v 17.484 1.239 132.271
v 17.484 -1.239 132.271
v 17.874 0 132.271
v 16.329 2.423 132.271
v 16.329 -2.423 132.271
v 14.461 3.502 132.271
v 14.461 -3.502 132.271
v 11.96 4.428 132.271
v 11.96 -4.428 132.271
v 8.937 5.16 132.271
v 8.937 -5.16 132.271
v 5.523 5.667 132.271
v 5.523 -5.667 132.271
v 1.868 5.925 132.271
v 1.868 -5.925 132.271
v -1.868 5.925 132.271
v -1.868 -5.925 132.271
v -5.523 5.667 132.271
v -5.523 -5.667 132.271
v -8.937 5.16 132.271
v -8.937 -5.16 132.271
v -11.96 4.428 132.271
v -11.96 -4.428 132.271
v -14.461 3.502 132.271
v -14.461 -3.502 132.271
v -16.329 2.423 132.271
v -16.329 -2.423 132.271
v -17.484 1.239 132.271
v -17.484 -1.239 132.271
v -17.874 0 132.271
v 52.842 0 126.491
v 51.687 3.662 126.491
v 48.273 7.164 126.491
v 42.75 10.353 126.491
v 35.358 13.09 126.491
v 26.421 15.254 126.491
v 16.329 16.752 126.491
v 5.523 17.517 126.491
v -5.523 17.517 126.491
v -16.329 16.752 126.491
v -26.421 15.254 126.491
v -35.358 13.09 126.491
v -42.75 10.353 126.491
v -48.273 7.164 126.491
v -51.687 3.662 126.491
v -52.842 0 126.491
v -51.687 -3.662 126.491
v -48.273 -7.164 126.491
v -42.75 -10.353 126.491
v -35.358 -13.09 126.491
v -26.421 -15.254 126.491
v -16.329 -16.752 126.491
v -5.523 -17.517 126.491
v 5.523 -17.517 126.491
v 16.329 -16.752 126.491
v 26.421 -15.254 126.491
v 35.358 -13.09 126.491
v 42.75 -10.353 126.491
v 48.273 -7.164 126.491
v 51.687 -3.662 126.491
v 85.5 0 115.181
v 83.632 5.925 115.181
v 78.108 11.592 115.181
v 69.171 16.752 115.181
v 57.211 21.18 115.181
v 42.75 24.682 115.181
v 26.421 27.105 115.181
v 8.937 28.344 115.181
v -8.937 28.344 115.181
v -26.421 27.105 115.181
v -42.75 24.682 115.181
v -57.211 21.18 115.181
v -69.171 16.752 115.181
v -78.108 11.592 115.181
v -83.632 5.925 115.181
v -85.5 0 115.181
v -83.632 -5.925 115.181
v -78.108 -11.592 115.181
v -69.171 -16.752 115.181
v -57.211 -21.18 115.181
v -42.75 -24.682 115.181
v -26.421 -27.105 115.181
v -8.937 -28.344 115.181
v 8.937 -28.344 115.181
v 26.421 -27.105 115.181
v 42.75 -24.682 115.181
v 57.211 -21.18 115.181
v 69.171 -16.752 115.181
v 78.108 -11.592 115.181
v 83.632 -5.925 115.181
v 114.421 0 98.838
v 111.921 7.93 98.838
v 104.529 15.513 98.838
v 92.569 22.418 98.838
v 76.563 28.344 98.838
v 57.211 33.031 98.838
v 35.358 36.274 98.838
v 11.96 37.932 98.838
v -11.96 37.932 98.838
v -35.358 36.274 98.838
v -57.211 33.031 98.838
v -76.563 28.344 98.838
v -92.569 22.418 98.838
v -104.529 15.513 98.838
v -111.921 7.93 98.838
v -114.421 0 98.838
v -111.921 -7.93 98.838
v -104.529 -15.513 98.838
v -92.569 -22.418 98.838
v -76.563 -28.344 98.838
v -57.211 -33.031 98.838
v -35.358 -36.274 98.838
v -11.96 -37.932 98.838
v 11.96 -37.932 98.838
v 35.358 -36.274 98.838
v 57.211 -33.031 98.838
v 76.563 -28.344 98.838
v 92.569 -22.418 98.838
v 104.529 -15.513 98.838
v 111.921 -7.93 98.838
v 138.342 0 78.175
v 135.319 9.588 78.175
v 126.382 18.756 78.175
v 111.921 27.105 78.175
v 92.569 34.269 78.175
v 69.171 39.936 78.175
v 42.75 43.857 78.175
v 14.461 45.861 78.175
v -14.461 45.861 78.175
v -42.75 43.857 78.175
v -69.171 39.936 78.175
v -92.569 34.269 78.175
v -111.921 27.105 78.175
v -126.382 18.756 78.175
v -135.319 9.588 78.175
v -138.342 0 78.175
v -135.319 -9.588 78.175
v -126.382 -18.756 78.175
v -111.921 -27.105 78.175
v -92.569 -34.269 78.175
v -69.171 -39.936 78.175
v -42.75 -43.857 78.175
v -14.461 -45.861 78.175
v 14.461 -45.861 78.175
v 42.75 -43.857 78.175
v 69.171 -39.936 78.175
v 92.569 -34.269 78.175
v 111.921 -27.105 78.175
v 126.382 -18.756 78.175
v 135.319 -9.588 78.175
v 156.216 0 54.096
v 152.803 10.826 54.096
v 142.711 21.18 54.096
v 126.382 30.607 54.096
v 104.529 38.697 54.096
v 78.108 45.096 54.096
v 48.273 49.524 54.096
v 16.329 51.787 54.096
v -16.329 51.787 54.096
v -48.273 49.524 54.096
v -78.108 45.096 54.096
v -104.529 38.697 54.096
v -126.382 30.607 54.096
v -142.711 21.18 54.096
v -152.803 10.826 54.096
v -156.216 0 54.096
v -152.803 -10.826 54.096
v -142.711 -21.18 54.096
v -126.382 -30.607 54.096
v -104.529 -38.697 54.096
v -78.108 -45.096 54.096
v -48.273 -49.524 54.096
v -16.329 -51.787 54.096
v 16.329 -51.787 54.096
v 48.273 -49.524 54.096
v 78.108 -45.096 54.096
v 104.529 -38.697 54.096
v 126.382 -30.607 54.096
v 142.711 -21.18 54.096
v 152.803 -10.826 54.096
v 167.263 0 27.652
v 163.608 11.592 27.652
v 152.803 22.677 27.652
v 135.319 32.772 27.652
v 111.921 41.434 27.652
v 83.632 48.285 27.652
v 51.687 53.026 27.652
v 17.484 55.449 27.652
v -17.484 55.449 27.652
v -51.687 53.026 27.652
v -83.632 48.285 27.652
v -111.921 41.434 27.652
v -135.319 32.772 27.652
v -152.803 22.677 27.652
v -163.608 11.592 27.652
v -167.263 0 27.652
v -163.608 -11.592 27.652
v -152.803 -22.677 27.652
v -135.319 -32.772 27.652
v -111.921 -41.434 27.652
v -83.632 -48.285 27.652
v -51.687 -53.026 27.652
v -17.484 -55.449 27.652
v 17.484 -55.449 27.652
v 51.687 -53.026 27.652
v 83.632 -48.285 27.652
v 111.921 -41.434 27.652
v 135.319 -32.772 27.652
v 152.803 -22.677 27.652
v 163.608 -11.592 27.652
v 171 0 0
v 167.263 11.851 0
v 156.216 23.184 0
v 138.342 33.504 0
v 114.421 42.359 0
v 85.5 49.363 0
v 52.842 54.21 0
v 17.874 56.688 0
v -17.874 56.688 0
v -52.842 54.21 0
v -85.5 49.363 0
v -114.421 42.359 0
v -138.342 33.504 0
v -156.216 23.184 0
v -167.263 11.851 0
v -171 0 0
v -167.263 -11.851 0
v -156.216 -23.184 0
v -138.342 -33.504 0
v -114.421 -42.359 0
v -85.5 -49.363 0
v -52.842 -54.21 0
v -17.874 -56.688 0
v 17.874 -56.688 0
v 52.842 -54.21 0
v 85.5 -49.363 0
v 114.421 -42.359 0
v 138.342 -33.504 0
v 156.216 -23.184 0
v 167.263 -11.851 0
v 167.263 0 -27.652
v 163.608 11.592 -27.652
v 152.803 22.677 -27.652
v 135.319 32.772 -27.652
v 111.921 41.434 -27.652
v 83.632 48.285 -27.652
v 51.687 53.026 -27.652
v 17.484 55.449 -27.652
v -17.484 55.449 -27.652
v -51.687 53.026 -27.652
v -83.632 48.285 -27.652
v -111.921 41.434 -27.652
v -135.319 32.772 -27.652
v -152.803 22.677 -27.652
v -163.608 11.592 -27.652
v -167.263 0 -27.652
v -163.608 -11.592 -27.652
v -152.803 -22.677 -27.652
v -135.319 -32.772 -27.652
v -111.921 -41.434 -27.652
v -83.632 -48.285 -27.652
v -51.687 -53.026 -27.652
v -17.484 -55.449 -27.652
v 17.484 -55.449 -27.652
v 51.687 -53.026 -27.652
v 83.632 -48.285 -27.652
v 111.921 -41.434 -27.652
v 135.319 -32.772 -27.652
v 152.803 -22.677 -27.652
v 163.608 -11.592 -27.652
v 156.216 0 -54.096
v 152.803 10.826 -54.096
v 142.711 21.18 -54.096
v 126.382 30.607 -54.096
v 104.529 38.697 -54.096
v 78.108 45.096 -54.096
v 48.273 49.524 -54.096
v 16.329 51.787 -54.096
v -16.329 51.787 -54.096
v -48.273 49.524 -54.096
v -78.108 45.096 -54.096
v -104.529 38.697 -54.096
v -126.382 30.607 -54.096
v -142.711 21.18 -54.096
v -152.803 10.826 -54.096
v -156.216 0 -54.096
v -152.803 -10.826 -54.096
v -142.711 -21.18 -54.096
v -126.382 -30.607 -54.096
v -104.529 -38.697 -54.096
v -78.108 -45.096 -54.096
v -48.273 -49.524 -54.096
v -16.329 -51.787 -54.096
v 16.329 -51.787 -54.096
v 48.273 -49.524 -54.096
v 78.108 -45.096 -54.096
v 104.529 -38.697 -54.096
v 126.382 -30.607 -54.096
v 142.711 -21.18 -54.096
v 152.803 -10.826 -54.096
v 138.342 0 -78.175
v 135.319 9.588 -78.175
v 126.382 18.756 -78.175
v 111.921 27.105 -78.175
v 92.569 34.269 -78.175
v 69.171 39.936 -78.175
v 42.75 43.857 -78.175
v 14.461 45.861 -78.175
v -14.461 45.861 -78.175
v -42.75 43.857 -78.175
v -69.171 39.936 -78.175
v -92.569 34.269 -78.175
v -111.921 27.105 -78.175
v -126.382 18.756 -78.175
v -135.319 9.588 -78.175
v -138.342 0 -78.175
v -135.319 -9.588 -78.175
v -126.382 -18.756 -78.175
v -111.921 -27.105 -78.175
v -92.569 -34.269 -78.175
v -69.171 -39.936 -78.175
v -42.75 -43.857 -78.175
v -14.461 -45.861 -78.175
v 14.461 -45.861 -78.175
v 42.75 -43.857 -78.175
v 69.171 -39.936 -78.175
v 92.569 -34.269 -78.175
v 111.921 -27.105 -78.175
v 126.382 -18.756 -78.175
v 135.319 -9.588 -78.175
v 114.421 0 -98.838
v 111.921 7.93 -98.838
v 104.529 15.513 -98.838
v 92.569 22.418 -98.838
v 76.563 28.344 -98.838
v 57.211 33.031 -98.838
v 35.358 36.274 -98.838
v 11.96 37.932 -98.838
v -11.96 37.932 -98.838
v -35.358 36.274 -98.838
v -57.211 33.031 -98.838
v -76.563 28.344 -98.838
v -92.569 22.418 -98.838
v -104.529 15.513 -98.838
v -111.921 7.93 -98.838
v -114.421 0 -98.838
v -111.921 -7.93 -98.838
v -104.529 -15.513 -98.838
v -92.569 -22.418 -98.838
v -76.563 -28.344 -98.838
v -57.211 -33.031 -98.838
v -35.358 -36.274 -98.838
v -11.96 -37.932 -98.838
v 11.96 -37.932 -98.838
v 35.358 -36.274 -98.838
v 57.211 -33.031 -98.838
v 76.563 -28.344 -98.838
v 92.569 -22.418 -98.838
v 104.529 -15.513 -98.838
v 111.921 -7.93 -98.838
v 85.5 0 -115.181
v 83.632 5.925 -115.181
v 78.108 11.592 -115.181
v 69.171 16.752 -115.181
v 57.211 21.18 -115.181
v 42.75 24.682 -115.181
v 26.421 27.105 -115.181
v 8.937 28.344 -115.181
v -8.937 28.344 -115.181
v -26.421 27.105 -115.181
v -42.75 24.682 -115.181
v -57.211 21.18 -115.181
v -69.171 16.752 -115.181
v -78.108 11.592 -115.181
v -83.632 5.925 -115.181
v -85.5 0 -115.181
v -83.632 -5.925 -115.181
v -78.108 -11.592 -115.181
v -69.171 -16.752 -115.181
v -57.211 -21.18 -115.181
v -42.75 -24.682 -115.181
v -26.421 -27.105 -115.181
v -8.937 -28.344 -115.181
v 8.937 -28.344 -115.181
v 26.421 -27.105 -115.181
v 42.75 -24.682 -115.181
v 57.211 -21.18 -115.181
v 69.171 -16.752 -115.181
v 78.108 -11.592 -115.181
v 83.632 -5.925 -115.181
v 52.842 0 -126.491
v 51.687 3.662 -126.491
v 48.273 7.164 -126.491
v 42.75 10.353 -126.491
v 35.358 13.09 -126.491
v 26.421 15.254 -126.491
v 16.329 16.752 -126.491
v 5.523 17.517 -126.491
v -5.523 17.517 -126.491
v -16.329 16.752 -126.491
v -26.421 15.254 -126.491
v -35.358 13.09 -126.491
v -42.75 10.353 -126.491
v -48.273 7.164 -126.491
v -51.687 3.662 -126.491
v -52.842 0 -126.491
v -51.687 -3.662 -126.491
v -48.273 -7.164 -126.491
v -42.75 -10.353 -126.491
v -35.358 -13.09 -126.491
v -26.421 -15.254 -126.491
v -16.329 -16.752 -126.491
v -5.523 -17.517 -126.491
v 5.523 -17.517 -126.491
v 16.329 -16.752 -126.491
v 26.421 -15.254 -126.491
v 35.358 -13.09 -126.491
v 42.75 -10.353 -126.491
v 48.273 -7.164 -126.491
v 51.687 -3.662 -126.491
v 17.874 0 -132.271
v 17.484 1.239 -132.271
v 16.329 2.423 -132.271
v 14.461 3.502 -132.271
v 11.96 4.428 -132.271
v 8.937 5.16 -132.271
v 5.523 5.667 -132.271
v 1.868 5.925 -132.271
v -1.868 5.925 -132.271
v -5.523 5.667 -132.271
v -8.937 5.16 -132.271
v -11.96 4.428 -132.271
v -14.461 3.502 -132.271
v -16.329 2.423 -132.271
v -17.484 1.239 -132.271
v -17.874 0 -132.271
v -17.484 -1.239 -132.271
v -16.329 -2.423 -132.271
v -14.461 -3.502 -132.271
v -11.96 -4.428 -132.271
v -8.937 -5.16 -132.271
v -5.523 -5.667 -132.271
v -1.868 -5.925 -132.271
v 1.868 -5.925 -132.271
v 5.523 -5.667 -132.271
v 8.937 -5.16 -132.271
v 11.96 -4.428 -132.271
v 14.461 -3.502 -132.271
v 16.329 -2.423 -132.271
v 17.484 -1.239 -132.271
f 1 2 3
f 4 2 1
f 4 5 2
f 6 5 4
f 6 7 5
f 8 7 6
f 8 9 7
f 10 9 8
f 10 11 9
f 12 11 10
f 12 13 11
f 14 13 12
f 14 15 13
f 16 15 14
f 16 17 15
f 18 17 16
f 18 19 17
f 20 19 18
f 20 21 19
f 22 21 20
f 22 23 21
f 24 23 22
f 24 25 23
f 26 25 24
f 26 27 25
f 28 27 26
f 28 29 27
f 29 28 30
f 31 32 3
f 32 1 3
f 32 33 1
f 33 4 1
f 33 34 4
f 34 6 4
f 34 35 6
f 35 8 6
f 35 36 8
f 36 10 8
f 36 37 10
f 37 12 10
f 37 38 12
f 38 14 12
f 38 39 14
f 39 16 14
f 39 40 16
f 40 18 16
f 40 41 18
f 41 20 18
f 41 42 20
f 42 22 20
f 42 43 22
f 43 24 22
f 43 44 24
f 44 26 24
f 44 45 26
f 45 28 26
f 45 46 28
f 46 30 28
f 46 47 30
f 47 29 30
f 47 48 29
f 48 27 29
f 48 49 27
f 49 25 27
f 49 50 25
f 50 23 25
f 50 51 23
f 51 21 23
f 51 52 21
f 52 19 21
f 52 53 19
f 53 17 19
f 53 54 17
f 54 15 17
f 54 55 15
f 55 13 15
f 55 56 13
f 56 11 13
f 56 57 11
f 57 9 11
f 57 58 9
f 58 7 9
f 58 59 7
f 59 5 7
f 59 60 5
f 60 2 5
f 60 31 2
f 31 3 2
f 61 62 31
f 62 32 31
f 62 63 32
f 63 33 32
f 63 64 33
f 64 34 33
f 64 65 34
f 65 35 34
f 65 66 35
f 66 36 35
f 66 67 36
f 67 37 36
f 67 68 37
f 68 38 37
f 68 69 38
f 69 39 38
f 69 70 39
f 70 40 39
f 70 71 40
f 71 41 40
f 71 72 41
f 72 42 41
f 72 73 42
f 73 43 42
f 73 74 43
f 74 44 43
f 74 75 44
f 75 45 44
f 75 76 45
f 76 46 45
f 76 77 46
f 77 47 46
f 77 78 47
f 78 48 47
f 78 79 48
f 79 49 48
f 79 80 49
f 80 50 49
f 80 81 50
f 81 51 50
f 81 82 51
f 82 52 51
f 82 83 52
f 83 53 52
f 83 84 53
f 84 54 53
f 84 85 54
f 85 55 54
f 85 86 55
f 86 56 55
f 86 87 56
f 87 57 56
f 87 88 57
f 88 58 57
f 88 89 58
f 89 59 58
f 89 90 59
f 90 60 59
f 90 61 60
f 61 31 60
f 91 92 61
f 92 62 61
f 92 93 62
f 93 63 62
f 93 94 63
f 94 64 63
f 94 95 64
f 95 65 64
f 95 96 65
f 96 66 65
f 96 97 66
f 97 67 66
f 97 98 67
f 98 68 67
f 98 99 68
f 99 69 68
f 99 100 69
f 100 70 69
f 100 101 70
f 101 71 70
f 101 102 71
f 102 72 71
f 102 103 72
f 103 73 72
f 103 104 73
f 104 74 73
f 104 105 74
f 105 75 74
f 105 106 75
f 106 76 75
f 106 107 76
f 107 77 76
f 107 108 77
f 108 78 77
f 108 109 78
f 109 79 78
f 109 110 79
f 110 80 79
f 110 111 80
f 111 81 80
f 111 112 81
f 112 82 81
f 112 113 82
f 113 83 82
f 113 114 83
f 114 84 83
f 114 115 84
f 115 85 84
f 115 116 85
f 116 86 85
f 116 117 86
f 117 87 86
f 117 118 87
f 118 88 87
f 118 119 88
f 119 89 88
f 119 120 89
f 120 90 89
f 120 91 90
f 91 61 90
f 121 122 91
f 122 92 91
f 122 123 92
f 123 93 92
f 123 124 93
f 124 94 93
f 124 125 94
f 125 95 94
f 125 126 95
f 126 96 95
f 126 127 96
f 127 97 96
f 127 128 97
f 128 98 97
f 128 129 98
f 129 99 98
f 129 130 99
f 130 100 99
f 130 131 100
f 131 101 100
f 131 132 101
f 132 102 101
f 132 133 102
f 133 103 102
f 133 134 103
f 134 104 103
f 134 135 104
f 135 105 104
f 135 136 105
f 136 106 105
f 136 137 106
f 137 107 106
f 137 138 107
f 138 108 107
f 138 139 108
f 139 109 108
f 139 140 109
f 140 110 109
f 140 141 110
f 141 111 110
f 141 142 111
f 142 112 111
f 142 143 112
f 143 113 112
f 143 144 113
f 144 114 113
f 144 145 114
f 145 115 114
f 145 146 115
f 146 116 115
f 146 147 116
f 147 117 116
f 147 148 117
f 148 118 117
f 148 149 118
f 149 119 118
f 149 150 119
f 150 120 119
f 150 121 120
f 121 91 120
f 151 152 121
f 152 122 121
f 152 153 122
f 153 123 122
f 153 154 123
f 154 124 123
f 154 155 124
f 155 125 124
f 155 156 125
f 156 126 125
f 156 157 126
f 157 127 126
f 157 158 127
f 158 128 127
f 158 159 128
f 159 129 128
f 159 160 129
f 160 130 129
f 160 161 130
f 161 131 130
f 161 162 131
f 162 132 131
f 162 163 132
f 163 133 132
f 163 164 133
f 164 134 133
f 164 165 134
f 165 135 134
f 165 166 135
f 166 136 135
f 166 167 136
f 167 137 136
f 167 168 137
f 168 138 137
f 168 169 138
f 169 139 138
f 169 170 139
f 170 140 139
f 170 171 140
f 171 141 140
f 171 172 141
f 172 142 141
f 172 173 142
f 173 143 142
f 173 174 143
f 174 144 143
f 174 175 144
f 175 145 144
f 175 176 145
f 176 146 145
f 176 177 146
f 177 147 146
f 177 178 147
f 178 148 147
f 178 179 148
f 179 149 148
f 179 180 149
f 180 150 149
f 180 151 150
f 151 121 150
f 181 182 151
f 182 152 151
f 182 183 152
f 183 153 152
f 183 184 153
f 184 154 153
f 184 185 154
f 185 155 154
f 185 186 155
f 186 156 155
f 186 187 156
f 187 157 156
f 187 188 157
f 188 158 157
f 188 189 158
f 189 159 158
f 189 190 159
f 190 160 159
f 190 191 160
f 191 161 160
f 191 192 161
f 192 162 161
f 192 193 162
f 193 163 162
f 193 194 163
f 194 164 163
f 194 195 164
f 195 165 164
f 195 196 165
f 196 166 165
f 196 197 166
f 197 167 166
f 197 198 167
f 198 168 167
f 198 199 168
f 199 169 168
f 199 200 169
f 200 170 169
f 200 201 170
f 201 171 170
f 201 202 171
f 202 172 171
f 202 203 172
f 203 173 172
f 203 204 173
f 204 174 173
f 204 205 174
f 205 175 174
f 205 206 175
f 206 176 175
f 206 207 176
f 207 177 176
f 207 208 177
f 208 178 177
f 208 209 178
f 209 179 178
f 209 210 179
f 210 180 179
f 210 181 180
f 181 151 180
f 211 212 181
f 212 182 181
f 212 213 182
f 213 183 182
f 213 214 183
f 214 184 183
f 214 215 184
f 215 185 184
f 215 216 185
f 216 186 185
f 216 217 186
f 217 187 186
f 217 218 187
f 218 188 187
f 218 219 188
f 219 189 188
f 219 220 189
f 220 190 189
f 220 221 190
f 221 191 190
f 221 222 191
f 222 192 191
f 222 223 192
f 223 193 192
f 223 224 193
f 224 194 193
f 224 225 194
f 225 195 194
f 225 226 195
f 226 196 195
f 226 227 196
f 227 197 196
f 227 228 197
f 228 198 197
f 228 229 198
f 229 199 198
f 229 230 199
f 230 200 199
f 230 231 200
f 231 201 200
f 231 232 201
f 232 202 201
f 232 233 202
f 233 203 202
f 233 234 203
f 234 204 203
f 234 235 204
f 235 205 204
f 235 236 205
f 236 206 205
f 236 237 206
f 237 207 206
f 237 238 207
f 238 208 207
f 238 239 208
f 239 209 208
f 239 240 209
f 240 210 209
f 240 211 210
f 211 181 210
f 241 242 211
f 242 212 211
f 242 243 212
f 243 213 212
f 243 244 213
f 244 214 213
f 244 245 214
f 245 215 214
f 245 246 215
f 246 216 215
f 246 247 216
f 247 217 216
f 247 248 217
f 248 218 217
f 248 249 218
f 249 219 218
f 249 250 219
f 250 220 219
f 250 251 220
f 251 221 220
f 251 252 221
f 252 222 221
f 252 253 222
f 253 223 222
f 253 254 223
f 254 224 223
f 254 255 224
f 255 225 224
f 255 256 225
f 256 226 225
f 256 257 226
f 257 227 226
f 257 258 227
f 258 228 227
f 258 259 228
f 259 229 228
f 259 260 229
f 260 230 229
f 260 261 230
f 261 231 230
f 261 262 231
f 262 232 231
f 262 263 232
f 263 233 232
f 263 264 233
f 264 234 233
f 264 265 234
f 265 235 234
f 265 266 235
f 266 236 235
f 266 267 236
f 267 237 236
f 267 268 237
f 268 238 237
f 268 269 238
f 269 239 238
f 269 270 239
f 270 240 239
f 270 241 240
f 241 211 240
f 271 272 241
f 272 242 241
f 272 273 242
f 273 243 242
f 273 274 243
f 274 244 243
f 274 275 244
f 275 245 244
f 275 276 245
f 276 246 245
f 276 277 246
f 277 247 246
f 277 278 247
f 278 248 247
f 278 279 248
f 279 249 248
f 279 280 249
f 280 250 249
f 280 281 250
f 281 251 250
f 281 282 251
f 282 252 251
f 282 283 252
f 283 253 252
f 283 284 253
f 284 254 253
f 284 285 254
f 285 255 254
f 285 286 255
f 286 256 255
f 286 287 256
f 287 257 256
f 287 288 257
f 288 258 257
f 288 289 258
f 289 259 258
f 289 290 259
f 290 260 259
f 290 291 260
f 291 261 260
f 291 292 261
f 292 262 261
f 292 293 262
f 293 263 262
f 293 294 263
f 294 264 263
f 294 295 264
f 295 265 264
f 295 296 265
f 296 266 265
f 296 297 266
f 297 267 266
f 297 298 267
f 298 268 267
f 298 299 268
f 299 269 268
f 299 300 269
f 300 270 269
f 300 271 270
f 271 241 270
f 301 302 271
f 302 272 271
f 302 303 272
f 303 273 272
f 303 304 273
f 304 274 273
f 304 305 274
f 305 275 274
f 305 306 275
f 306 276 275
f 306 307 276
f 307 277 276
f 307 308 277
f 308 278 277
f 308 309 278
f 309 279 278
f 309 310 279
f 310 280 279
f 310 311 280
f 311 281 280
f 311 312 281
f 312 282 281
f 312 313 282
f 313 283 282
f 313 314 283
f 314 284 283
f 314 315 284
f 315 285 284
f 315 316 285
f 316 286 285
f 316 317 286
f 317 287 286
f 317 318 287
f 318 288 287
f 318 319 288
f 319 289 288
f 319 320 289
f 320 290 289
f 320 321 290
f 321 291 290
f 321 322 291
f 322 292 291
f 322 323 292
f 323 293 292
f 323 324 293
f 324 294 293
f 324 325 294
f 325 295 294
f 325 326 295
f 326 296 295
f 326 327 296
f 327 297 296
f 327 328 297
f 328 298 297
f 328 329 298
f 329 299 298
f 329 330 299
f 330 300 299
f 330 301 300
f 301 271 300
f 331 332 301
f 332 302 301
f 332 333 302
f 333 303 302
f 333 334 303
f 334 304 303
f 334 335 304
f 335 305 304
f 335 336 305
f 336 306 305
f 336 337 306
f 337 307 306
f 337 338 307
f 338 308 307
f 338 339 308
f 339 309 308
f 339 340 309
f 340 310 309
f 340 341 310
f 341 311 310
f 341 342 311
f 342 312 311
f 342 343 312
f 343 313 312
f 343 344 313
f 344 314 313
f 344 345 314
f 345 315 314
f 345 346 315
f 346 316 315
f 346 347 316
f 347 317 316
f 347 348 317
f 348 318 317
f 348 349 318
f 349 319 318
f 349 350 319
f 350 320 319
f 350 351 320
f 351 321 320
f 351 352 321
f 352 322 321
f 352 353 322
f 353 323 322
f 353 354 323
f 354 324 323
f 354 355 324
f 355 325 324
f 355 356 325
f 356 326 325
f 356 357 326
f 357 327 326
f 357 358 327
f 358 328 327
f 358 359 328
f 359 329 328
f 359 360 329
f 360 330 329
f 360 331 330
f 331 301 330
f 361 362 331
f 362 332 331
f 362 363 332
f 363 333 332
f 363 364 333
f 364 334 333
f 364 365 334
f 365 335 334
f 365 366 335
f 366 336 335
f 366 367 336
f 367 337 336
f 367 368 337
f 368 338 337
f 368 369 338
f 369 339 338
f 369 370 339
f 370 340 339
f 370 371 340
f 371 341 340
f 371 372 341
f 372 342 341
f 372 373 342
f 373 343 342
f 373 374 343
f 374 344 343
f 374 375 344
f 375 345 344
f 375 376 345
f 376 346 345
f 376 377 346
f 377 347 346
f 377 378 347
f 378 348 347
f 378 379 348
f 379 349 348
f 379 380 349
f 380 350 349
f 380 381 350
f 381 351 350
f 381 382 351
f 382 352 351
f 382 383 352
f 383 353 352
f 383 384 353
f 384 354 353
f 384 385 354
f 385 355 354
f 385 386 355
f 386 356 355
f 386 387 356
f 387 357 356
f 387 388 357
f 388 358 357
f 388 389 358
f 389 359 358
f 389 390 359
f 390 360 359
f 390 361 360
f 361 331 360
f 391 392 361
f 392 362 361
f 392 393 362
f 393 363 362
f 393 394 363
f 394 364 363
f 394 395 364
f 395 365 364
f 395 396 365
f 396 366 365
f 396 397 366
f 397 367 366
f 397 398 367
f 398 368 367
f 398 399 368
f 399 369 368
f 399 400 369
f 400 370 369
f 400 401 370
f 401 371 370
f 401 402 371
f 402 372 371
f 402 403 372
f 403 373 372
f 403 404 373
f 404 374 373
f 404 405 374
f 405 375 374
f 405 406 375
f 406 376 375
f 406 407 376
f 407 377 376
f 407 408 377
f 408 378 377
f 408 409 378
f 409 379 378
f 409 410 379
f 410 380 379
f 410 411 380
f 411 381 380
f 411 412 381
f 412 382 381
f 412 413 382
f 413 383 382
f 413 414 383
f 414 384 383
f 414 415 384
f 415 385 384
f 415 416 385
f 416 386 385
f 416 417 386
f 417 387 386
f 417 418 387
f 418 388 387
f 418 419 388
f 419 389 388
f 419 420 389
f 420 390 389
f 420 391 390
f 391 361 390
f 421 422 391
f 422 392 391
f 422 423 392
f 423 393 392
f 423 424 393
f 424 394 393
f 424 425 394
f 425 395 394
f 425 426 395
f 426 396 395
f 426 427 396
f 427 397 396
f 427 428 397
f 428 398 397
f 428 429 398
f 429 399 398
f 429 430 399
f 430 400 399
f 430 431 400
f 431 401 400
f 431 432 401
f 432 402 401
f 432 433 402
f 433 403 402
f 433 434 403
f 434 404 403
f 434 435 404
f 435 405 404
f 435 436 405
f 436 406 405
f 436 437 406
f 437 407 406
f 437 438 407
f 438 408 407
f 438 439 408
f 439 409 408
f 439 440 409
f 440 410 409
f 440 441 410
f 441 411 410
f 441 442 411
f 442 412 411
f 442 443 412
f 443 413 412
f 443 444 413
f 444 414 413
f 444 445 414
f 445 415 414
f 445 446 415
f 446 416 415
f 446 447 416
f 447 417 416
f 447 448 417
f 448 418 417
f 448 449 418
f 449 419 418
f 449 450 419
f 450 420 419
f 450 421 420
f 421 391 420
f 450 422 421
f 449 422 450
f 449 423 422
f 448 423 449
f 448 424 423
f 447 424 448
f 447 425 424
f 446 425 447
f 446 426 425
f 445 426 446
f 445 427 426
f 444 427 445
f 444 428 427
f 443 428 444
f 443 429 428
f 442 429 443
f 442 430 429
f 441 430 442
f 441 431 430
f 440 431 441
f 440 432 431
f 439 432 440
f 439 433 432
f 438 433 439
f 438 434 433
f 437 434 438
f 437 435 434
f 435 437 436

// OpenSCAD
// Generated by SolidPython 1.0.1 on 2020-07-29 00:46:48


scale(v = [9, 3, 7]) {
	sphere(r = 19);
}
/***********************************************
*********      SolidPython code:      **********
************************************************
 
# import packages: SolidPython
from solid import *
from solid.utils import *
from itertools import chain, combinations, permutations


class Resize:

    def __init__(self, scad_file):
        self.scad_file = scad_file
        #self.scad_file = import_scad(scad_file)
        # cone/cylinder param:
        self.r1 = 0
        self.r2 = 0
        self.h = 0
        # rectangular prism param:
        self.w = 0
        self.l = 0
        # ellipse param:
        self.r = 0

    # import OpenScad code (file name corresponds to shape)


    # classify shape + parameters
    def assign(self, param1, param2, param3):
        if self.scad_file == 'cone.scad':
            self.r1 = param1
            self.r2 = param2
            self.h = param3
        elif self.scad_file == 'cylinder.scad':
            self.r1 = param1
            self.r2 = param2
            self.h = param3
        elif self.scad_file == 'rectangularPrism.scad':
            self.h = param1
            self.l = param2
            self.w = param3
        else:
            self.r = param1
            self.h = param2

    # resize parameters
    def iterate(self):
        x = range(3, 20, 2)
        i = 1
        if self.scad_file == 'cone.scad':
            tempList = list(permutations(x, 2))
            for temp in tempList:
                param1 = temp[0]
                param2 = temp[1]
                filepath = 'produced_scad_files/' + 'cone' + str(param1) + '_' + str(param2) + '_' + '.scad'
                scad_render_to_file(cylinder(h=param1, r1=param2, r2=0), filepath)

        elif self.scad_file == 'cylinder.scad':
            tempList = list(permutations(x, 3))
            for temp in tempList:
                param1 = temp[0]
                param2 = temp[1]
                filepath = 'produced_scad_files/' + 'cylinder' + str(param1) + '_' + str(param2) + '_' + '.scad'
                scad_render_to_file(cylinder(h=param1, r1=param2, r2=param2), filepath)

        elif self.scad_file == 'rectangularPrism.scad':
            tempList = list(permutations(x, 3))
            for temp in tempList:
                param1 = temp[0]
                param2 = temp[1]
                param3 = temp[2]
                filepath = 'produced_scad_files/' + 'rectangularPrism' + str(param1) + '_' + str(param2) + '_' + str(
                    param3) + '.scad'
                scad_render_to_file(cube(size=(param1, param2, param3)), filepath)

        elif self.scad_file == 'ellipse.scad':
            tempList = list(permutations(x, 4))
            for temp in tempList:
                param1 = temp[0]
                param2 = temp[1]
                param3 = temp[2]
                param4 = temp[3]
                filepath = 'produced_scad_files/' + 'ellipse' + str(param1) + '_' + str(param2) + '_' + str(param3) + '_' + str(param4) + '.scad'
                scad_render_to_file(scale([param1, param2, param3])(sphere(r=param4)), filepath)

    def render_to_scadfile(self):
        scad_render_to_file(scad, 'example.scad') 
 
************************************************/
